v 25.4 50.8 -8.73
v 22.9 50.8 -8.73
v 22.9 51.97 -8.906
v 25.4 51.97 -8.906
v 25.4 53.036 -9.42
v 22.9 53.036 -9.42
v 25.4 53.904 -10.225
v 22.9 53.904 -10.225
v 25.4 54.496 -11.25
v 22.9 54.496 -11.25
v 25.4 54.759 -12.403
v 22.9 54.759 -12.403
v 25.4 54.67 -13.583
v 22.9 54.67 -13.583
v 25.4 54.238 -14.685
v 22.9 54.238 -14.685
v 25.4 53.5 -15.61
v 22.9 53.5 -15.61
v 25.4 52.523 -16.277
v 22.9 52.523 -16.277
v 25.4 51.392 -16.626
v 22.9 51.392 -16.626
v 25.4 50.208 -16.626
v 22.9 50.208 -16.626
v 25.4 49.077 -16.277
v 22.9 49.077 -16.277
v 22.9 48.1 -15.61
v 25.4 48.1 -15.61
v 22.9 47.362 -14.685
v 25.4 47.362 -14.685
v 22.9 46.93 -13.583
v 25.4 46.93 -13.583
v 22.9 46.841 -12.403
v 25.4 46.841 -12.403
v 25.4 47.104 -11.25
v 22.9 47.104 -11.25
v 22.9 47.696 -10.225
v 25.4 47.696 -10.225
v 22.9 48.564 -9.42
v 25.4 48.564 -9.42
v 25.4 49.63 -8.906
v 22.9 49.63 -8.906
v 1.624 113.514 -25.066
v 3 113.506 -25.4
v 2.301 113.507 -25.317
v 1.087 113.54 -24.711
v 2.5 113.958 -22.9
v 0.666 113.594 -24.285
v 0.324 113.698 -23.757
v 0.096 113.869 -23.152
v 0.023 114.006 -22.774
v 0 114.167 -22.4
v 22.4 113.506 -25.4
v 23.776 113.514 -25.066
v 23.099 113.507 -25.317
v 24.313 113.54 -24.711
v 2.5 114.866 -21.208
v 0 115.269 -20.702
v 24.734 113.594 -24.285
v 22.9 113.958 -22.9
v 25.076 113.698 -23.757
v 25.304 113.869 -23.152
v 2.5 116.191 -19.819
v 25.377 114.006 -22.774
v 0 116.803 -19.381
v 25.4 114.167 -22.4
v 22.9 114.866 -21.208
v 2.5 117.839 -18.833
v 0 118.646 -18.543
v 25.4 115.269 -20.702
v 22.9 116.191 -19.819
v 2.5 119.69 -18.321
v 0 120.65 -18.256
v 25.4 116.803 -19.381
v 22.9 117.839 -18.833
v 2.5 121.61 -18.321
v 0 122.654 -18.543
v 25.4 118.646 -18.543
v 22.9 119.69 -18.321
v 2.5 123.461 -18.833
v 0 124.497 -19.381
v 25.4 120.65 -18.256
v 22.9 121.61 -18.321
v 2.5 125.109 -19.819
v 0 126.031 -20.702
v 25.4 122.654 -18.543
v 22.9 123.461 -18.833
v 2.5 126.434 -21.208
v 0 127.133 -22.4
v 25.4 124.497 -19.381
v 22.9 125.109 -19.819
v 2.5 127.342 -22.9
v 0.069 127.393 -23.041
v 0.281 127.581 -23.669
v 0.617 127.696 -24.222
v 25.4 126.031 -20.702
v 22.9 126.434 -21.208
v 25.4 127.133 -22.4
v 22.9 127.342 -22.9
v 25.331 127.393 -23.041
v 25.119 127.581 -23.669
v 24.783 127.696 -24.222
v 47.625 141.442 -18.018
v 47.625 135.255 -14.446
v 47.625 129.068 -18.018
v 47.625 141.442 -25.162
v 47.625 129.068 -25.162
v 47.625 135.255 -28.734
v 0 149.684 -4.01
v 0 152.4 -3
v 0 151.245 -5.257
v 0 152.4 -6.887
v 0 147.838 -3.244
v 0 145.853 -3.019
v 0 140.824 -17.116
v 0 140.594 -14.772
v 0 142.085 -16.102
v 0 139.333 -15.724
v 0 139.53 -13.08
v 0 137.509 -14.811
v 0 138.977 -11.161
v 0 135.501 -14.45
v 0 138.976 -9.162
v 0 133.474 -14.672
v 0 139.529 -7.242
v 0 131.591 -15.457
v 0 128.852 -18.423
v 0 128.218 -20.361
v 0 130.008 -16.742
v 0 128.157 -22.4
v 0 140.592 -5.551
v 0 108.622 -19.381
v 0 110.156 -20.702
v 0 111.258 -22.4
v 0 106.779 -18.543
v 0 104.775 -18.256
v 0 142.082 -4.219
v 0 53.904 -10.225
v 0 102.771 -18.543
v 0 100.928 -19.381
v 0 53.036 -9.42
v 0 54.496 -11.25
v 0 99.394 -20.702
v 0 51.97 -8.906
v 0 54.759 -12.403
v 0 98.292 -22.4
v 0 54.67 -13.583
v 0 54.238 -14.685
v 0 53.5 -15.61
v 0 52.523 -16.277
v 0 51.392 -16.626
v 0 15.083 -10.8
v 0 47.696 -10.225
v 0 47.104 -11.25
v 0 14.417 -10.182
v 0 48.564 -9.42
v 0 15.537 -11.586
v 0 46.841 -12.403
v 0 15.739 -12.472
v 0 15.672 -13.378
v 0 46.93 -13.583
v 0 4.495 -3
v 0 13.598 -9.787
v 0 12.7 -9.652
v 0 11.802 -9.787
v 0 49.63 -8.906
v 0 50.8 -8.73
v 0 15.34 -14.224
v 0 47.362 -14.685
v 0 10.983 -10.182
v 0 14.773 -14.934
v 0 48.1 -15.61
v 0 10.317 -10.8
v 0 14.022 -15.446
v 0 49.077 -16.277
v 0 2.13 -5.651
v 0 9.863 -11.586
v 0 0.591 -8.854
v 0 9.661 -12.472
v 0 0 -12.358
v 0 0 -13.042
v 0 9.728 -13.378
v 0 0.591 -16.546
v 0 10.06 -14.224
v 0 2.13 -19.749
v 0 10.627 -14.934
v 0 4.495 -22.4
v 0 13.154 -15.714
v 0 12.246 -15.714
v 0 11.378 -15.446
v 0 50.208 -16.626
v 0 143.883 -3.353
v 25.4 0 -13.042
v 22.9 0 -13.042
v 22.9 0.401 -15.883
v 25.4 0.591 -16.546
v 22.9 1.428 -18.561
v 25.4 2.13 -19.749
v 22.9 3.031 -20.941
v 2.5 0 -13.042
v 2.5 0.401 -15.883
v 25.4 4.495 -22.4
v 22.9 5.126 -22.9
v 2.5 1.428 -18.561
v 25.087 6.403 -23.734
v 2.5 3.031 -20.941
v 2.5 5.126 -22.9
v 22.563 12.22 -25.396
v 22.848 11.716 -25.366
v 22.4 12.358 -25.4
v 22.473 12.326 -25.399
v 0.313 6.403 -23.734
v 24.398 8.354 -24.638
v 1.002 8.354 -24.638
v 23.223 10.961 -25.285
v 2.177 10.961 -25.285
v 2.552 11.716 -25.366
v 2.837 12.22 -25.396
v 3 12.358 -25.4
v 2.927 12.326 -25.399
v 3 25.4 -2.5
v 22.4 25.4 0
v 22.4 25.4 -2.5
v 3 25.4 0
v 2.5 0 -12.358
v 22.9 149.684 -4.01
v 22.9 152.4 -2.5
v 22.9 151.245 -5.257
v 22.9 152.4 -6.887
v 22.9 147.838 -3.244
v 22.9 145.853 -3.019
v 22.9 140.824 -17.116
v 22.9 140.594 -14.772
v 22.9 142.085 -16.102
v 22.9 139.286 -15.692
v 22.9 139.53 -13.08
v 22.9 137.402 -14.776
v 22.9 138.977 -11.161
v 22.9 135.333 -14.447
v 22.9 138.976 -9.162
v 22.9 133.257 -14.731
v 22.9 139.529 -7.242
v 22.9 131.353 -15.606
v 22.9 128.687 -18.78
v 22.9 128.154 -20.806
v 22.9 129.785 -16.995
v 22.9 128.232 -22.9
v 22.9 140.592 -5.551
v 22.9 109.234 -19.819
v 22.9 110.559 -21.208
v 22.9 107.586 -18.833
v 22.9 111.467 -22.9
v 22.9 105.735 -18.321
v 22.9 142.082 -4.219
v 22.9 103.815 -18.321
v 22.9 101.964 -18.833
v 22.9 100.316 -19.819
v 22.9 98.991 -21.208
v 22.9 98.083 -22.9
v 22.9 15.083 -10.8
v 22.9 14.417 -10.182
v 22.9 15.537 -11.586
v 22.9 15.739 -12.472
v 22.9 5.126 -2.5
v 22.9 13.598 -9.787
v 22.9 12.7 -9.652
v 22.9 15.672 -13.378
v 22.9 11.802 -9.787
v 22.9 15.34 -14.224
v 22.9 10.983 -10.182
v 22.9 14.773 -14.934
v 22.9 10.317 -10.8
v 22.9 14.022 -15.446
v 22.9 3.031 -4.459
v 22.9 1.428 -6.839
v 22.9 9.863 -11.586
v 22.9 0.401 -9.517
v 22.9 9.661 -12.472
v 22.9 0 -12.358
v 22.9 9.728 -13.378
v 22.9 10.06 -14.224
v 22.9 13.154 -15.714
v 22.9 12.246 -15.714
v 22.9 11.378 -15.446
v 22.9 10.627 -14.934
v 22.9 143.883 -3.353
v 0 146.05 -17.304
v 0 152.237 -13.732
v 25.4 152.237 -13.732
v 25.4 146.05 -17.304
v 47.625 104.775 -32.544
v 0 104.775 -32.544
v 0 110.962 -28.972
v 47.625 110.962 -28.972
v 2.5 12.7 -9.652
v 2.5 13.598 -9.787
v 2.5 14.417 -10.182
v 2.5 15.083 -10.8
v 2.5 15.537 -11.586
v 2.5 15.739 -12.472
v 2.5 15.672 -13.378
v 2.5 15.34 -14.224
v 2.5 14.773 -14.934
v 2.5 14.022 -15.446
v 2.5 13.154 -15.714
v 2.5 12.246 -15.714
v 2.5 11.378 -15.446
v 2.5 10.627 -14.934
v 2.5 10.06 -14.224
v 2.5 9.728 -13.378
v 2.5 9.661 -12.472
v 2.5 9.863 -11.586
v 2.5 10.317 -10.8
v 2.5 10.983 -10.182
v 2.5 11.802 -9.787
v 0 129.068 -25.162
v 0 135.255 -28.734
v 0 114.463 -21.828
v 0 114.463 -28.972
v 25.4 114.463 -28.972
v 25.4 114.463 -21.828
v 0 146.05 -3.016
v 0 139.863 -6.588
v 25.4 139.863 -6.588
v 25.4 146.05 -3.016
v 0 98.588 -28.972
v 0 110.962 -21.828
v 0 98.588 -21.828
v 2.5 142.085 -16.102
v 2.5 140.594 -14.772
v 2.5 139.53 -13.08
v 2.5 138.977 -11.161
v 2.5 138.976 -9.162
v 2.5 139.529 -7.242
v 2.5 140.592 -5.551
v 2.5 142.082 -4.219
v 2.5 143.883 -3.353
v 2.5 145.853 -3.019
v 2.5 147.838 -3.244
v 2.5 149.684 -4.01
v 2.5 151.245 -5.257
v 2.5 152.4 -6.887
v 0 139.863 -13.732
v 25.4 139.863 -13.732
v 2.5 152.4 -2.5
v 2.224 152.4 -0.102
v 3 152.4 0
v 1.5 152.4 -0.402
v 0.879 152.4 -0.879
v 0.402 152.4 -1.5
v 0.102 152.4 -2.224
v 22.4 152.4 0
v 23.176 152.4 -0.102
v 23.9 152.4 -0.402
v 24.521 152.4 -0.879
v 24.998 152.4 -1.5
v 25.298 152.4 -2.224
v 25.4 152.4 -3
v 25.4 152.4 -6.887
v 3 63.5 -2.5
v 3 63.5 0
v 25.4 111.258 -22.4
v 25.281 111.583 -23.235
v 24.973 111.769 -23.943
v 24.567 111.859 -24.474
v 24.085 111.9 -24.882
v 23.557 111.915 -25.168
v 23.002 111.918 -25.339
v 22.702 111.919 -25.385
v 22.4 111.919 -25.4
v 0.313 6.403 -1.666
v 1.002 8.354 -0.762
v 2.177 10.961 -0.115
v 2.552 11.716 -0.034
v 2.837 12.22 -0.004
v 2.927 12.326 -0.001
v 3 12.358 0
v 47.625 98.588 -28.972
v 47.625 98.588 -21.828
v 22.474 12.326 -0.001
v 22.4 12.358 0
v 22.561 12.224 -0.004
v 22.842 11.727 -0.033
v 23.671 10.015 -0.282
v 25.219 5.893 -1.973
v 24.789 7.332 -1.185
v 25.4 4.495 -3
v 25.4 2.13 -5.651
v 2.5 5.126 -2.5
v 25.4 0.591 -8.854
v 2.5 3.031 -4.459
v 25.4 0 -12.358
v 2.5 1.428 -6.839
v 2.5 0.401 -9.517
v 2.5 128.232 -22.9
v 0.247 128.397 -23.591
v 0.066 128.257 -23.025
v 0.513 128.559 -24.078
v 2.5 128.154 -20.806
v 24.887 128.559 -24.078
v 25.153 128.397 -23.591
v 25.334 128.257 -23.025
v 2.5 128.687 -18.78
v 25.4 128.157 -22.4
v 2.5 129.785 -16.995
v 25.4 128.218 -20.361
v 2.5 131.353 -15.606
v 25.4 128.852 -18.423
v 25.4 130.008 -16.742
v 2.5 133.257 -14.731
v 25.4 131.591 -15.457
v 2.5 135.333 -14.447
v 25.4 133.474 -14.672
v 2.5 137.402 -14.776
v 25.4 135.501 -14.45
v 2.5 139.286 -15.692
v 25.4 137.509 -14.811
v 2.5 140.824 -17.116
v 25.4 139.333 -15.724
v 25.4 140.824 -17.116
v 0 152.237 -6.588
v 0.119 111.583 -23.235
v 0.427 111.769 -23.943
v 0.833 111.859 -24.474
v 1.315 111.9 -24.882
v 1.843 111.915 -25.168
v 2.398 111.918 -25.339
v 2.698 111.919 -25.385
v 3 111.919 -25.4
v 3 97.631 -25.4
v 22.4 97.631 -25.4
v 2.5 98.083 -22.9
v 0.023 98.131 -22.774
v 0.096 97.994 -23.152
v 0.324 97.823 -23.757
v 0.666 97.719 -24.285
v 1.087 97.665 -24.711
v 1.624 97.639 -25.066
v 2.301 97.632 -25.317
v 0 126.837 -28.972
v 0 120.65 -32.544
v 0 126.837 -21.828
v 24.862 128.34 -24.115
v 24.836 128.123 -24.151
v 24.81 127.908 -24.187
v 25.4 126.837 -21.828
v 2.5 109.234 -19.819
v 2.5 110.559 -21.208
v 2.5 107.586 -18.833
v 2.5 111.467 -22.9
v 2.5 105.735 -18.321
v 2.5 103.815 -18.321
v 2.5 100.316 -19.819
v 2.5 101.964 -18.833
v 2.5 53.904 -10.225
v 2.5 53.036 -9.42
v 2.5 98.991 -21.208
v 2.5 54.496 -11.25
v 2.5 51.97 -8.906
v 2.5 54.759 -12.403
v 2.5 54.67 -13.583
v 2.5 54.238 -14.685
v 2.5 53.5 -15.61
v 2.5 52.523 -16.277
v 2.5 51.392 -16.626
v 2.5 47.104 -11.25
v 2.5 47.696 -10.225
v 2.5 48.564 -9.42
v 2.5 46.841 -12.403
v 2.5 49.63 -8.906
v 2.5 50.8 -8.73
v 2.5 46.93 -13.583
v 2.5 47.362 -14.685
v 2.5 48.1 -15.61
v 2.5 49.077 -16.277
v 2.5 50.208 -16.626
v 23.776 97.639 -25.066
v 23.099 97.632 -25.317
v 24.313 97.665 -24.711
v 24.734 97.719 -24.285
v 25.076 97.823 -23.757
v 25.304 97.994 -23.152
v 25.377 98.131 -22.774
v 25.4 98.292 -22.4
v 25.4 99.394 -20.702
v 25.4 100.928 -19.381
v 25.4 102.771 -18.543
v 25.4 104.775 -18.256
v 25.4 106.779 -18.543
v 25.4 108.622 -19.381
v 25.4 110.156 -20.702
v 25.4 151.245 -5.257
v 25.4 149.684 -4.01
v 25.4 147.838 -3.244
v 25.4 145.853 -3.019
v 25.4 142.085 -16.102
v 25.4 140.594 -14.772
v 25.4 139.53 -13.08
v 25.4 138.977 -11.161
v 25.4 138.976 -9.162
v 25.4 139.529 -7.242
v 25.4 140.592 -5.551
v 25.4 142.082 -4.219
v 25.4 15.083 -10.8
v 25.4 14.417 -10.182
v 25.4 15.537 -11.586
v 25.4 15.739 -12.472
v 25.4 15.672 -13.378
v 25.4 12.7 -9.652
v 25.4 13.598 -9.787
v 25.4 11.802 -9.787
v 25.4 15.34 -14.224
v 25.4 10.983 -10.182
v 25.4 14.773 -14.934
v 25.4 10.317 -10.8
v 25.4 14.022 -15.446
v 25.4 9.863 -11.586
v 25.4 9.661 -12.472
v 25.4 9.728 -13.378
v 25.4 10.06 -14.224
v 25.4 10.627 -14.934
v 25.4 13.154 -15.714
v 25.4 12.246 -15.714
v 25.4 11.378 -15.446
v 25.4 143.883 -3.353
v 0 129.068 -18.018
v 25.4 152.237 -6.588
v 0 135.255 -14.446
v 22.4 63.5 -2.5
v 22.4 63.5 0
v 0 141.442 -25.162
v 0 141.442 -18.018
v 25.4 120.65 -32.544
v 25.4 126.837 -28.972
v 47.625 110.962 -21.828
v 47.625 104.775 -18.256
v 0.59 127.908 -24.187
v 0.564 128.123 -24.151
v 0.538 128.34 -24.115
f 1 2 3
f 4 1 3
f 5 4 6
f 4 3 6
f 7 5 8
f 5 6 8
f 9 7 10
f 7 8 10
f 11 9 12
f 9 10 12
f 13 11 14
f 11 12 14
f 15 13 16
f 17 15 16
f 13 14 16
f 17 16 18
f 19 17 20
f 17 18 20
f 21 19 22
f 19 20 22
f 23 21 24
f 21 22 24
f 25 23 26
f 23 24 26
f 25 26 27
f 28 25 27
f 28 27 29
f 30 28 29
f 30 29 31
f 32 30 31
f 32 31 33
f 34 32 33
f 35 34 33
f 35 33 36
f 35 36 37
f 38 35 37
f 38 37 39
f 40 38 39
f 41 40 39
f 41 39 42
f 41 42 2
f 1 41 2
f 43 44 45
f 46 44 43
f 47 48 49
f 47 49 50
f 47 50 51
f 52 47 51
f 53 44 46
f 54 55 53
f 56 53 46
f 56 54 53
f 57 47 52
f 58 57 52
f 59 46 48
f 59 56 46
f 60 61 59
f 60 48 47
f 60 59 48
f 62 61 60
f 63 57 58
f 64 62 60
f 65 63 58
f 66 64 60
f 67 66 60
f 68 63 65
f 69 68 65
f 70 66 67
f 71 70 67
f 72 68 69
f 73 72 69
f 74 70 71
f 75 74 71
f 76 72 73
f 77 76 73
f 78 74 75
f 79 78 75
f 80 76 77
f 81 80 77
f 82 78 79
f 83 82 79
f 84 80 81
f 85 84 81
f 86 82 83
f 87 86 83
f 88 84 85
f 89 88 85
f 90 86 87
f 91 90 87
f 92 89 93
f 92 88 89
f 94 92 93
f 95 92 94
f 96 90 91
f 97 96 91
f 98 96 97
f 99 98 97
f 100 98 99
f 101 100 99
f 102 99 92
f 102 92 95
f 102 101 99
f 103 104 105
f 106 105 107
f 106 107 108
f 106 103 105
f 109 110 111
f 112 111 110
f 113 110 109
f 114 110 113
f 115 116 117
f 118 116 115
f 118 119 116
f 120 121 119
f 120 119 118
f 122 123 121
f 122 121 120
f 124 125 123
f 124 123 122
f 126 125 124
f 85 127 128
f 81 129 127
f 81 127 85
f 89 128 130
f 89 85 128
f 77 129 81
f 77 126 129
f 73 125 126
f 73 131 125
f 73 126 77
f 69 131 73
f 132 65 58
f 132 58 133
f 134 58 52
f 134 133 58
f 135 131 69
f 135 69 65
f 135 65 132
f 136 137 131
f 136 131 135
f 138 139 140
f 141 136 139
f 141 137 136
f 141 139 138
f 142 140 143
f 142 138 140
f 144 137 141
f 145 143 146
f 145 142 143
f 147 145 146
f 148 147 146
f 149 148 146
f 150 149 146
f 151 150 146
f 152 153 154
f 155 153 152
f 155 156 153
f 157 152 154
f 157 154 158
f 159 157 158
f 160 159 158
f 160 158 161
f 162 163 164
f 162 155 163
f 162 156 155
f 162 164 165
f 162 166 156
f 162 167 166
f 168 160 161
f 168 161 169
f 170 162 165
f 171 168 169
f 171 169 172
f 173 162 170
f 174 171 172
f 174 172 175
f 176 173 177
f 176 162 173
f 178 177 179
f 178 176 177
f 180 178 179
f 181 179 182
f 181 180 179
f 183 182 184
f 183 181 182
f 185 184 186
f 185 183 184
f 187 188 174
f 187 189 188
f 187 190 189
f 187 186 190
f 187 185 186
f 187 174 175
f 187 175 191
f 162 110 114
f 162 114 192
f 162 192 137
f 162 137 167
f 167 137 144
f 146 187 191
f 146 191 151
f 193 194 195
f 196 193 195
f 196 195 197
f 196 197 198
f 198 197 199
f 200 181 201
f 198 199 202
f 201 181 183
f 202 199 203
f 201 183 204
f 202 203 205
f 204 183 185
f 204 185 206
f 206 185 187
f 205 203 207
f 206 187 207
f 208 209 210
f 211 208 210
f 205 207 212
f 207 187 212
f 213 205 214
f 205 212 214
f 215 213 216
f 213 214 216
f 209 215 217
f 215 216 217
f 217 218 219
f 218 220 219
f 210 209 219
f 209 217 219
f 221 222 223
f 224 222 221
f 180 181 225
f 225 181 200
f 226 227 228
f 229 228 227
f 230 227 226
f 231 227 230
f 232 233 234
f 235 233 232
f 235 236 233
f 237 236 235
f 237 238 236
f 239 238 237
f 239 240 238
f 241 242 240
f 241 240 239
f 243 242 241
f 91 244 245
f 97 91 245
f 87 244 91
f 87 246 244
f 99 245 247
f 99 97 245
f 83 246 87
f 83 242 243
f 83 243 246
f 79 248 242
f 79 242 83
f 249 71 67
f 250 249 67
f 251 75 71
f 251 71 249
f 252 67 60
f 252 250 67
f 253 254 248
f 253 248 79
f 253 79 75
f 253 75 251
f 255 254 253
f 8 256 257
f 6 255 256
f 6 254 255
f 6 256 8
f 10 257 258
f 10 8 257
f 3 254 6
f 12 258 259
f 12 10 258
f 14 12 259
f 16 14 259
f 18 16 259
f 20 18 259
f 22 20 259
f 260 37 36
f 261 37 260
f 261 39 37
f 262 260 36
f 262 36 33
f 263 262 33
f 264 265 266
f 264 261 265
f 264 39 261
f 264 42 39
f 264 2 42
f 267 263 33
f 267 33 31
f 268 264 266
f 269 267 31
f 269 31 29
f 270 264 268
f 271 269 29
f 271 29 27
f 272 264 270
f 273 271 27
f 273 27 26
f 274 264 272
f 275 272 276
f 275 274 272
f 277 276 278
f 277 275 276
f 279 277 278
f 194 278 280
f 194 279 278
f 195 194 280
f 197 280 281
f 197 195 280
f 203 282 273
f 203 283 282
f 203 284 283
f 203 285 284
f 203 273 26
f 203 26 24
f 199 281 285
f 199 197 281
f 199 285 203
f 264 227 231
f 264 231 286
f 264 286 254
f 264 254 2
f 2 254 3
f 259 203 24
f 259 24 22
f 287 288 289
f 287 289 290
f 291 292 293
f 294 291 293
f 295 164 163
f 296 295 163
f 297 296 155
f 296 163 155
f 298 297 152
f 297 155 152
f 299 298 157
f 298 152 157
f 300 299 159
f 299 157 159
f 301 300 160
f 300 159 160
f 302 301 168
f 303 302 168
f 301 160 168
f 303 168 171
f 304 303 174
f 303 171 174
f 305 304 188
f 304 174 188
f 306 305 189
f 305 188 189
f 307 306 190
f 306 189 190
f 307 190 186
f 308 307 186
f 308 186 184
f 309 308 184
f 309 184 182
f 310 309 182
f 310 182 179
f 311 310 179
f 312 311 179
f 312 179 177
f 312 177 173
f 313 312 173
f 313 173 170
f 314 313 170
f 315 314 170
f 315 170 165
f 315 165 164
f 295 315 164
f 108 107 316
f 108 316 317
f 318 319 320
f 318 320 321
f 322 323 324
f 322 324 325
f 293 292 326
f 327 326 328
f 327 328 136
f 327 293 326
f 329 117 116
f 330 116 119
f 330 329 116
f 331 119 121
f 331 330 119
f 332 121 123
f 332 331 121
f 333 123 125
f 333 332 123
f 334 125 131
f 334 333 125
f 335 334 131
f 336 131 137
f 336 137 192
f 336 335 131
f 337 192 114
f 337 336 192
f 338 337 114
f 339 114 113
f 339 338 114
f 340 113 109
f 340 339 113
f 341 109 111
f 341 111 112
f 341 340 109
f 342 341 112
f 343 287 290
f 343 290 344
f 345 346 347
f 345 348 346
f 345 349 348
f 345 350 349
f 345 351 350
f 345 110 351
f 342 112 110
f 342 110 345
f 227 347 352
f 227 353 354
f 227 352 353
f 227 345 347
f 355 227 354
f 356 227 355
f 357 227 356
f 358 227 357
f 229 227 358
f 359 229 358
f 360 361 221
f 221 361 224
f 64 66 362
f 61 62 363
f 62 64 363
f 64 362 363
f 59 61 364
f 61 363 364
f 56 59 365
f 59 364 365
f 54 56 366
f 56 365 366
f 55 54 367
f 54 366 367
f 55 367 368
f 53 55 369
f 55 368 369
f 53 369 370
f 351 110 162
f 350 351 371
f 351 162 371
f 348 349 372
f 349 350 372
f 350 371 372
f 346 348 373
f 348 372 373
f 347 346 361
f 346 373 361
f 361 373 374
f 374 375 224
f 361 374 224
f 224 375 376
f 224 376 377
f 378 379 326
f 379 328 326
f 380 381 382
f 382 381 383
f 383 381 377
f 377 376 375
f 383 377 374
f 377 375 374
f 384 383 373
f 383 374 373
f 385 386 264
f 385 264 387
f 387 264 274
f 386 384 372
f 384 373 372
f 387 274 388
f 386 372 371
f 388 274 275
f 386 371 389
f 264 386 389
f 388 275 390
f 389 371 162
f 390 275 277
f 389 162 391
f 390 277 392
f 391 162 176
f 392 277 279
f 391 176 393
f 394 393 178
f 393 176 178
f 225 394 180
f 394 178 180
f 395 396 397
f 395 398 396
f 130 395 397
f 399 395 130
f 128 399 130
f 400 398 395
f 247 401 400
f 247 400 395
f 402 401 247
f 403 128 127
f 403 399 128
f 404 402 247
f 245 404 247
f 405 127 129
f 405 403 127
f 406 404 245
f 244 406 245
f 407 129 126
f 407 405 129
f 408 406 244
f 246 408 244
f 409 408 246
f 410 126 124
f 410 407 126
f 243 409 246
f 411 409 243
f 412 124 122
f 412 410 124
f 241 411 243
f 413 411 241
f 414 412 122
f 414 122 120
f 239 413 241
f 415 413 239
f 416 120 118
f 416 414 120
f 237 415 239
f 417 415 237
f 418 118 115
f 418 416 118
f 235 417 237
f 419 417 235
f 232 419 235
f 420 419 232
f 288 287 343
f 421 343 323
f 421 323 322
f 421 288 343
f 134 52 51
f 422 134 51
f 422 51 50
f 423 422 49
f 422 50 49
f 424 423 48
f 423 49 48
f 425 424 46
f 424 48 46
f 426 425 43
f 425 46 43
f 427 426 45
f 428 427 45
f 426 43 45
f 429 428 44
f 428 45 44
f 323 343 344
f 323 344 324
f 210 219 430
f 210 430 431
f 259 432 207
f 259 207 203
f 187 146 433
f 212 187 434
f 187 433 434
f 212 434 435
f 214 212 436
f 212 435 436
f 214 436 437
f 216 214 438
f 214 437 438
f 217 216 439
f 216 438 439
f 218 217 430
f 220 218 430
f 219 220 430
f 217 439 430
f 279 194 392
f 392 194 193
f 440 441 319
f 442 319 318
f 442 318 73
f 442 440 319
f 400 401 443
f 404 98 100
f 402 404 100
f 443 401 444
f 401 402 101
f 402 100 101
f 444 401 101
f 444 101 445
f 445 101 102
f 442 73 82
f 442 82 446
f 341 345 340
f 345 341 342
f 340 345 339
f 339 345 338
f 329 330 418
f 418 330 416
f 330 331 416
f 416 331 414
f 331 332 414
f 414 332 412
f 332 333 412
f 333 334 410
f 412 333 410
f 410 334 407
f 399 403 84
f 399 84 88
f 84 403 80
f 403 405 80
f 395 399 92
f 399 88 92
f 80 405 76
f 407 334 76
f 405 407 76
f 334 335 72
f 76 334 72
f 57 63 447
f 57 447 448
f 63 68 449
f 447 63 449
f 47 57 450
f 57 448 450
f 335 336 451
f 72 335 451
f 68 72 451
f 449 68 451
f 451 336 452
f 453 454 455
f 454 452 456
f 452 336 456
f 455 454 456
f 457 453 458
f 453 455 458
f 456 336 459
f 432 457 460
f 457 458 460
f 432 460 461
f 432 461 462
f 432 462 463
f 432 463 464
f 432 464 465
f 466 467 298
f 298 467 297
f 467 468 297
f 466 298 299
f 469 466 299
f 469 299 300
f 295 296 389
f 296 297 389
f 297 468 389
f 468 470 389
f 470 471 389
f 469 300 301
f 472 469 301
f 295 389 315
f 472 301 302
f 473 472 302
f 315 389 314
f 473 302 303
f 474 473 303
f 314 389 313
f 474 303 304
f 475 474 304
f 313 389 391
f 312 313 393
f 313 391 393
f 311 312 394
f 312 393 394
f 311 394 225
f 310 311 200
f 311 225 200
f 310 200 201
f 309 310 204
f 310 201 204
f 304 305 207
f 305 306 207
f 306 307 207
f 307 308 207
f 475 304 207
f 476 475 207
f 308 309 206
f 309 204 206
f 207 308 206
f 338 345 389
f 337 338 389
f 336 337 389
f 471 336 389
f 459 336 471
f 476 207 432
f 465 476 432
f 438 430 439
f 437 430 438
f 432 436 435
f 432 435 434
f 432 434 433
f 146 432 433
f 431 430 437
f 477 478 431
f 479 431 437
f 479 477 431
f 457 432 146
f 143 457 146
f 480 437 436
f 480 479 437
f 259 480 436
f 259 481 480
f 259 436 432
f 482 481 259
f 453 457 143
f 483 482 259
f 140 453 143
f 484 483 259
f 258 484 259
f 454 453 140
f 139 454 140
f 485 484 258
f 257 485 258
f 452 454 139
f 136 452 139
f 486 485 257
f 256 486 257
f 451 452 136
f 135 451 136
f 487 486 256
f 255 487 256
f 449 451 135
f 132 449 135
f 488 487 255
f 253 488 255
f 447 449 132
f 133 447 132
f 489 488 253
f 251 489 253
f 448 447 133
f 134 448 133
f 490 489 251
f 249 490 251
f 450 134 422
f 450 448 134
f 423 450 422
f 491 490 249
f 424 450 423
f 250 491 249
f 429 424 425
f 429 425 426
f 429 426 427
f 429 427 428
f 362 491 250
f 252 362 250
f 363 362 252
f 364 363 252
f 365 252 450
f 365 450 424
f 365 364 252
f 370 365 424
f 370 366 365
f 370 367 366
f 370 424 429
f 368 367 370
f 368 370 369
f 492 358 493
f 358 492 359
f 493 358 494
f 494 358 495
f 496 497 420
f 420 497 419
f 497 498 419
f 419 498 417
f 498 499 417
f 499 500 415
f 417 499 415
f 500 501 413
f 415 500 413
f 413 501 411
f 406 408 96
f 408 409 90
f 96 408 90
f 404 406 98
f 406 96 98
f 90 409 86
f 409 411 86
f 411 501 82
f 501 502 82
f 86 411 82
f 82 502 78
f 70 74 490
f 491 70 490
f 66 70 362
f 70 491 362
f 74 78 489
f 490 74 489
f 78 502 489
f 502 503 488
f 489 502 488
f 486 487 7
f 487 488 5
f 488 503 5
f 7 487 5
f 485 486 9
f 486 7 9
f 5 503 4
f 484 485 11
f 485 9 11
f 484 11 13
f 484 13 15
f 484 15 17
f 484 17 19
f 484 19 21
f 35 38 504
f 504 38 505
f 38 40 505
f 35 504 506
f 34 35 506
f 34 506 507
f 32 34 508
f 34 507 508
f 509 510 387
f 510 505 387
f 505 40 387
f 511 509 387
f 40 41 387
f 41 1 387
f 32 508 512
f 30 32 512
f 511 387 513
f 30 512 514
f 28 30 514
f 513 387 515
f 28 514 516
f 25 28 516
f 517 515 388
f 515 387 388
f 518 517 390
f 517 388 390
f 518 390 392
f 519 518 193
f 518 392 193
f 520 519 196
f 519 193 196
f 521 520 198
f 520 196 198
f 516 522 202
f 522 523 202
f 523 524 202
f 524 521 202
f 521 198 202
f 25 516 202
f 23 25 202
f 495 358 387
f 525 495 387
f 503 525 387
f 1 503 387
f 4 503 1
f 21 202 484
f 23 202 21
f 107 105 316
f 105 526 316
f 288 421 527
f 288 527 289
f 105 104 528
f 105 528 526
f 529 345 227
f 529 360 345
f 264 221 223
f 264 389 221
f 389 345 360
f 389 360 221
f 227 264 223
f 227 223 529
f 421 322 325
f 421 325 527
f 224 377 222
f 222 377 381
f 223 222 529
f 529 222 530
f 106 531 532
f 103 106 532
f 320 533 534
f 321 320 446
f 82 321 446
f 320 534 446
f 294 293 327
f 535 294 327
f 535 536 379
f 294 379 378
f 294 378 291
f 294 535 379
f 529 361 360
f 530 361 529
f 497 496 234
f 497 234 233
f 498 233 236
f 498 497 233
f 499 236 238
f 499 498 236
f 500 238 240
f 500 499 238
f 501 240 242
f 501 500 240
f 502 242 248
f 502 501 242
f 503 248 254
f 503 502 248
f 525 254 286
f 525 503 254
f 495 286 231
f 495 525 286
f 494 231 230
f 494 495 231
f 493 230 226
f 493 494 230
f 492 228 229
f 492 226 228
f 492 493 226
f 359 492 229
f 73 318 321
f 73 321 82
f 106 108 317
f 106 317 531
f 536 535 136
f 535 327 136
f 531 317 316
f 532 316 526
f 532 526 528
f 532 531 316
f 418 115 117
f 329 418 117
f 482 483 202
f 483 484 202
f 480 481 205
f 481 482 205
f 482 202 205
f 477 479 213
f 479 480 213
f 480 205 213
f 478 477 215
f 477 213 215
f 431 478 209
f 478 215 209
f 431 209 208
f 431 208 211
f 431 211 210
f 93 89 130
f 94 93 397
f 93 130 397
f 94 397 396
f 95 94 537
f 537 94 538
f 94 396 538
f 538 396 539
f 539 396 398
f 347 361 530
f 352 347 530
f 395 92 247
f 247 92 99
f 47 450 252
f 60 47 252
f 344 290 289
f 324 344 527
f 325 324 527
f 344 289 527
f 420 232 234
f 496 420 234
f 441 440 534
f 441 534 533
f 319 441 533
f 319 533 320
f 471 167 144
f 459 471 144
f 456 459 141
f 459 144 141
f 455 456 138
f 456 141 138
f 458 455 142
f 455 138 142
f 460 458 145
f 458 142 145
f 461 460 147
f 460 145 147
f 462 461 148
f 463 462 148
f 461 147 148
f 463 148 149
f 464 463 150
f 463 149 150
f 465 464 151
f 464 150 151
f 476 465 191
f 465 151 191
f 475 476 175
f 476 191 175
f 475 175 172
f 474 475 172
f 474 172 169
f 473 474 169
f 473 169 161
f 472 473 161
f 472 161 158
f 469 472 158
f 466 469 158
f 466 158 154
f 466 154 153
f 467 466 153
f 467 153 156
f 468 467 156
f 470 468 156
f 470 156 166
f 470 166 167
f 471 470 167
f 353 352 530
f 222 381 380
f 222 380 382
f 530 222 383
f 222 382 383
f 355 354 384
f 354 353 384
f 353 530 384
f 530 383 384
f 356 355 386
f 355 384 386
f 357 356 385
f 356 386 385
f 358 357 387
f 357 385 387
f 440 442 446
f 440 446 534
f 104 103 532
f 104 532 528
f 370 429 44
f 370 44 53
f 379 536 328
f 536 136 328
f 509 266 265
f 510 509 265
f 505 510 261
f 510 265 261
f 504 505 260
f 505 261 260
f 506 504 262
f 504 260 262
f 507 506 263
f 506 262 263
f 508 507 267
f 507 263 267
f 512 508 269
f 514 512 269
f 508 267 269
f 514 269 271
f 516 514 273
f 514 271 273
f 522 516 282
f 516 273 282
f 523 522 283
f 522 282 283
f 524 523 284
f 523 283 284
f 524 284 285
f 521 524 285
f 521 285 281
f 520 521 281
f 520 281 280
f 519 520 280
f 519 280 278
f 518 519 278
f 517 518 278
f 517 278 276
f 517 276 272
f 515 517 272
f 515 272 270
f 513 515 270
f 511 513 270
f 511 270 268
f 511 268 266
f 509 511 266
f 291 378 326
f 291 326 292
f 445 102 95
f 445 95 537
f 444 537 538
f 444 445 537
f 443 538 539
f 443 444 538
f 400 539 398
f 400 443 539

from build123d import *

# Parameters (mm, degrees)
SKETCH1_W             = 25.4
SKETCH1_H             = 25.4
SKETCH1_W_2           = 20.4
SKETCH1_H_2           = 20.4
BOSS_EXTRUDE1_DEPTH   = 152.4
SKETCH2_R             = 3.048
CUT_EXTRUDE1_DEPTH    = 203.2
FILLET1_R             = 3
SKETCH15_R            = 3.97
CUT_EXTRUDE9_DEPTH    = 157.576115805
CUT_EXTRUDE10_DEPTH   = 10
CUT_EXTRUDE11_START   = -25.4
CUT_EXTRUDE11_DEPTH   = 25.4
BOSS_EXTRUDE2_DEPTH   = 25.4
BOSS_EXTRUDE2_2_DEPTH = 25.4
BOSS_EXTRUDE2_3_DEPTH = 25.4
BOSS_EXTRUDE2_4_DEPTH = 25.4
BOSS_EXTRUDE3_DEPTH   = 22.225


# Read off the part's stored shape, not the designer's step: Cut-Extrude11
with BuildPart() as part:
    # Sketch1 → Boss-Extrude1 (new body)
    with BuildSketch(Plane(origin=(0, 0, 0), x_dir=(1, 0, 0), z_dir=(0, 1, 0))):
        with Locations((12.7, 12.7)):
            Rectangle(SKETCH1_W, SKETCH1_H)
        with Locations((12.7, 12.7)):
            Rectangle(SKETCH1_W_2, SKETCH1_H_2, mode=Mode.SUBTRACT)
    extrude(amount=BOSS_EXTRUDE1_DEPTH)

    # Sketch2 → Cut-Extrude1 (cut)
    with BuildSketch(Plane.ZY):
        with Locations((-12.7, 12.7)):
            Circle(SKETCH2_R)
        with BuildLine():
            Line((-25.4, 13.042161995), (-33.088640308, 13.042161995))
            Line((-33.088640308, 13.042161995), (-33.088640308, -7.68562413))
            Line((-33.088640308, -7.68562413), (17.838569311, -8.829541687))
            Line((17.838569311, -8.829541687), (0.004608409, 12.7))
            ThreePointArc((0.004608409, 12.7), (-12.871096514, -0.003456255), (-25.4, 13.042161995))
        make_face()
    extrude(amount=-CUT_EXTRUDE1_DEPTH, mode=Mode.SUBTRACT)

    # Fillet1
    # the kernel refuses this fillet: 3 mm, written as the material it takes off along each edge
    with BuildSketch(Plane(origin=(0, 170.4, -25.4), x_dir=(0, 0, 1), z_dir=(0, -1, 0)), Plane(origin=(25.4, -5.642161995, 0), x_dir=(-1, 0, 0), z_dir=(0, 1, 0))) as fillet1_piece_1:
        with BuildLine():
            CenterArc((FILLET1_R, -FILLET1_R), FILLET1_R, 90, 90)
            Line((0, -FILLET1_R), (-FILLET1_R * 0.02, -FILLET1_R))
            Line((-FILLET1_R * 0.02, -FILLET1_R), (-FILLET1_R * 0.02, FILLET1_R * 0.02))
            Line((-FILLET1_R * 0.02, FILLET1_R * 0.02), (FILLET1_R, FILLET1_R * 0.02))
            Line((FILLET1_R, FILLET1_R * 0.02), (FILLET1_R, 0))
        make_face()
    extrude(amount=176.042161995, mode=Mode.SUBTRACT)
    with BuildSketch(Plane(origin=(25.4, -5.642161995, -25.4), x_dir=(-1, 0, 0), z_dir=(0, 1, 0)), Plane(origin=(0, -5.642161995, 0), x_dir=(1, 0, 0), z_dir=(0, 1, 0))) as fillet1_piece_2:
        with BuildLine():
            CenterArc((FILLET1_R, FILLET1_R), FILLET1_R, 180, 90)
            Line((0, FILLET1_R), (-FILLET1_R * 0.02, FILLET1_R))
            Line((-FILLET1_R * 0.02, FILLET1_R), (-FILLET1_R * 0.02, -FILLET1_R * 0.02))
            Line((-FILLET1_R * 0.02, -FILLET1_R * 0.02), (FILLET1_R, -FILLET1_R * 0.02))
            Line((FILLET1_R, -FILLET1_R * 0.02), (FILLET1_R, 0))
        make_face()
    extrude(amount=176.042161995, mode=Mode.SUBTRACT)

    # Sketch15 → Cut-Extrude9 (cut, through all)
    with BuildSketch(Plane.ZY):
        with Locations((-12.7, 50.8)):
            Circle(SKETCH15_R)
    extrude(amount=-CUT_EXTRUDE9_DEPTH, mode=Mode.SUBTRACT)

    # Sketch16 → Cut-Extrude10 (cut)
    with BuildSketch(Plane.XY):
        Polygon((3, 63.5), (22.4, 63.5), (22.4, 38.1), (22.4, 25.4), (3, 25.4), (3, 38.1), align=None)
    extrude(amount=-CUT_EXTRUDE10_DEPTH, mode=Mode.SUBTRACT)

    # Cut-Extrude11 outline → Cut-Extrude11 (cut)
    with BuildSketch(Plane.ZY.offset(CUT_EXTRUDE11_START)):
        with BuildLine():
            Line((-17.115600123, 140.823923576), (-16.102381509, 142.084994822))
            ThreePointArc((-16.102381509, 142.084994822), (-4.832560404, 141.290635399), (-6.88728491, 152.4))
            Line((-6.88728491, 152.4), (-25.4, 152.4))
            Line((-25.4, 152.4), (-25.400002306, 113.50625))
            ThreePointArc((-25.400002306, 113.50625), (-18.280723067, 120.059186987), (-24.222424264, 127.696025791))
            Line((-24.222424264, 127.696025791), (-24.078264617, 128.558605204))
            ThreePointArc((-24.078264617, 128.558605204), (-15.377456881, 131.728319967), (-17.115600123, 140.823923576))
        make_face()
        with BuildLine():
            Line((-25.400002306, 111.91875), (-25.400002306, 97.63125))
            ThreePointArc((-25.400002306, 97.63125), (-18.25625, 104.775), (-25.400002306, 111.91875))
        make_face()
    extrude(amount=CUT_EXTRUDE11_DEPTH, mode=Mode.SUBTRACT)


with BuildPart() as body_2:
    # Sketch21 → Boss-Extrude2 (new body)
    with BuildSketch(Plane.ZY):
        Polygon((-28.971875, 110.961668978), (-32.54375, 104.775), (-28.971875, 98.588331022), (-21.828125, 98.588331022), (-18.25625, 104.775), (-21.828125, 110.961668978), align=None)
    extrude(amount=-BOSS_EXTRUDE2_DEPTH)



with BuildPart() as body_3:
    # Sketch21 → Boss-Extrude2 2 (new body)
    with BuildSketch(Plane.ZY):
        Polygon((-18.25625, 120.65), (-21.828125, 126.836668978), (-28.971875, 126.836668978), (-32.54375, 120.65), (-28.971875, 114.463331022), (-21.828125, 114.463331022), align=None)
    extrude(amount=-BOSS_EXTRUDE2_2_DEPTH)


with BuildPart() as body_4:
    # Sketch21 → Boss-Extrude2 3 (new body)
    with BuildSketch(Plane.ZY):
        Polygon((-18.018125, 141.441668978), (-25.161875, 141.441668978), (-28.73375, 135.255), (-25.161875, 129.068331022), (-18.018125, 129.068331022), (-14.44625, 135.255), align=None)
    extrude(amount=-BOSS_EXTRUDE2_3_DEPTH)


with BuildPart() as body_5:
    # Sketch21 → Boss-Extrude2 4 (new body)
    with BuildSketch(Plane.ZY):
        Polygon((-3.01625, 146.05), (-6.588125, 152.236668978), (-13.731875, 152.236668978), (-17.30375, 146.05), (-13.731875, 139.863331022), (-6.588125, 139.863331022), align=None)
    extrude(amount=-BOSS_EXTRUDE2_4_DEPTH)


with BuildPart() as body_2_1:
    add(body_2.part)

    add(body_4.part)  # Boss-Extrude3 merges body 4
    # Sketch22 → Boss-Extrude3 (add)
    with BuildSketch(Plane(origin=(25.4, 0, 0), x_dir=(0, 0, -1), z_dir=(1, 0, 0))):
        Polygon((18.018125, 141.441668978), (14.44625, 135.255), (18.018125, 129.068331022), (25.161875, 129.068331022), (28.73375, 135.255), (25.161875, 141.441668978), align=None)
        Polygon((28.971875, 110.961668978), (21.828125, 110.961668978), (18.25625, 104.775), (21.828125, 98.588331022), (28.971875, 98.588331022), (32.54375, 104.775), align=None)
    extrude(amount=BOSS_EXTRUDE3_DEPTH)


solid = Compound([part.part, body_3.part, body_5.part, body_2_1.part])
